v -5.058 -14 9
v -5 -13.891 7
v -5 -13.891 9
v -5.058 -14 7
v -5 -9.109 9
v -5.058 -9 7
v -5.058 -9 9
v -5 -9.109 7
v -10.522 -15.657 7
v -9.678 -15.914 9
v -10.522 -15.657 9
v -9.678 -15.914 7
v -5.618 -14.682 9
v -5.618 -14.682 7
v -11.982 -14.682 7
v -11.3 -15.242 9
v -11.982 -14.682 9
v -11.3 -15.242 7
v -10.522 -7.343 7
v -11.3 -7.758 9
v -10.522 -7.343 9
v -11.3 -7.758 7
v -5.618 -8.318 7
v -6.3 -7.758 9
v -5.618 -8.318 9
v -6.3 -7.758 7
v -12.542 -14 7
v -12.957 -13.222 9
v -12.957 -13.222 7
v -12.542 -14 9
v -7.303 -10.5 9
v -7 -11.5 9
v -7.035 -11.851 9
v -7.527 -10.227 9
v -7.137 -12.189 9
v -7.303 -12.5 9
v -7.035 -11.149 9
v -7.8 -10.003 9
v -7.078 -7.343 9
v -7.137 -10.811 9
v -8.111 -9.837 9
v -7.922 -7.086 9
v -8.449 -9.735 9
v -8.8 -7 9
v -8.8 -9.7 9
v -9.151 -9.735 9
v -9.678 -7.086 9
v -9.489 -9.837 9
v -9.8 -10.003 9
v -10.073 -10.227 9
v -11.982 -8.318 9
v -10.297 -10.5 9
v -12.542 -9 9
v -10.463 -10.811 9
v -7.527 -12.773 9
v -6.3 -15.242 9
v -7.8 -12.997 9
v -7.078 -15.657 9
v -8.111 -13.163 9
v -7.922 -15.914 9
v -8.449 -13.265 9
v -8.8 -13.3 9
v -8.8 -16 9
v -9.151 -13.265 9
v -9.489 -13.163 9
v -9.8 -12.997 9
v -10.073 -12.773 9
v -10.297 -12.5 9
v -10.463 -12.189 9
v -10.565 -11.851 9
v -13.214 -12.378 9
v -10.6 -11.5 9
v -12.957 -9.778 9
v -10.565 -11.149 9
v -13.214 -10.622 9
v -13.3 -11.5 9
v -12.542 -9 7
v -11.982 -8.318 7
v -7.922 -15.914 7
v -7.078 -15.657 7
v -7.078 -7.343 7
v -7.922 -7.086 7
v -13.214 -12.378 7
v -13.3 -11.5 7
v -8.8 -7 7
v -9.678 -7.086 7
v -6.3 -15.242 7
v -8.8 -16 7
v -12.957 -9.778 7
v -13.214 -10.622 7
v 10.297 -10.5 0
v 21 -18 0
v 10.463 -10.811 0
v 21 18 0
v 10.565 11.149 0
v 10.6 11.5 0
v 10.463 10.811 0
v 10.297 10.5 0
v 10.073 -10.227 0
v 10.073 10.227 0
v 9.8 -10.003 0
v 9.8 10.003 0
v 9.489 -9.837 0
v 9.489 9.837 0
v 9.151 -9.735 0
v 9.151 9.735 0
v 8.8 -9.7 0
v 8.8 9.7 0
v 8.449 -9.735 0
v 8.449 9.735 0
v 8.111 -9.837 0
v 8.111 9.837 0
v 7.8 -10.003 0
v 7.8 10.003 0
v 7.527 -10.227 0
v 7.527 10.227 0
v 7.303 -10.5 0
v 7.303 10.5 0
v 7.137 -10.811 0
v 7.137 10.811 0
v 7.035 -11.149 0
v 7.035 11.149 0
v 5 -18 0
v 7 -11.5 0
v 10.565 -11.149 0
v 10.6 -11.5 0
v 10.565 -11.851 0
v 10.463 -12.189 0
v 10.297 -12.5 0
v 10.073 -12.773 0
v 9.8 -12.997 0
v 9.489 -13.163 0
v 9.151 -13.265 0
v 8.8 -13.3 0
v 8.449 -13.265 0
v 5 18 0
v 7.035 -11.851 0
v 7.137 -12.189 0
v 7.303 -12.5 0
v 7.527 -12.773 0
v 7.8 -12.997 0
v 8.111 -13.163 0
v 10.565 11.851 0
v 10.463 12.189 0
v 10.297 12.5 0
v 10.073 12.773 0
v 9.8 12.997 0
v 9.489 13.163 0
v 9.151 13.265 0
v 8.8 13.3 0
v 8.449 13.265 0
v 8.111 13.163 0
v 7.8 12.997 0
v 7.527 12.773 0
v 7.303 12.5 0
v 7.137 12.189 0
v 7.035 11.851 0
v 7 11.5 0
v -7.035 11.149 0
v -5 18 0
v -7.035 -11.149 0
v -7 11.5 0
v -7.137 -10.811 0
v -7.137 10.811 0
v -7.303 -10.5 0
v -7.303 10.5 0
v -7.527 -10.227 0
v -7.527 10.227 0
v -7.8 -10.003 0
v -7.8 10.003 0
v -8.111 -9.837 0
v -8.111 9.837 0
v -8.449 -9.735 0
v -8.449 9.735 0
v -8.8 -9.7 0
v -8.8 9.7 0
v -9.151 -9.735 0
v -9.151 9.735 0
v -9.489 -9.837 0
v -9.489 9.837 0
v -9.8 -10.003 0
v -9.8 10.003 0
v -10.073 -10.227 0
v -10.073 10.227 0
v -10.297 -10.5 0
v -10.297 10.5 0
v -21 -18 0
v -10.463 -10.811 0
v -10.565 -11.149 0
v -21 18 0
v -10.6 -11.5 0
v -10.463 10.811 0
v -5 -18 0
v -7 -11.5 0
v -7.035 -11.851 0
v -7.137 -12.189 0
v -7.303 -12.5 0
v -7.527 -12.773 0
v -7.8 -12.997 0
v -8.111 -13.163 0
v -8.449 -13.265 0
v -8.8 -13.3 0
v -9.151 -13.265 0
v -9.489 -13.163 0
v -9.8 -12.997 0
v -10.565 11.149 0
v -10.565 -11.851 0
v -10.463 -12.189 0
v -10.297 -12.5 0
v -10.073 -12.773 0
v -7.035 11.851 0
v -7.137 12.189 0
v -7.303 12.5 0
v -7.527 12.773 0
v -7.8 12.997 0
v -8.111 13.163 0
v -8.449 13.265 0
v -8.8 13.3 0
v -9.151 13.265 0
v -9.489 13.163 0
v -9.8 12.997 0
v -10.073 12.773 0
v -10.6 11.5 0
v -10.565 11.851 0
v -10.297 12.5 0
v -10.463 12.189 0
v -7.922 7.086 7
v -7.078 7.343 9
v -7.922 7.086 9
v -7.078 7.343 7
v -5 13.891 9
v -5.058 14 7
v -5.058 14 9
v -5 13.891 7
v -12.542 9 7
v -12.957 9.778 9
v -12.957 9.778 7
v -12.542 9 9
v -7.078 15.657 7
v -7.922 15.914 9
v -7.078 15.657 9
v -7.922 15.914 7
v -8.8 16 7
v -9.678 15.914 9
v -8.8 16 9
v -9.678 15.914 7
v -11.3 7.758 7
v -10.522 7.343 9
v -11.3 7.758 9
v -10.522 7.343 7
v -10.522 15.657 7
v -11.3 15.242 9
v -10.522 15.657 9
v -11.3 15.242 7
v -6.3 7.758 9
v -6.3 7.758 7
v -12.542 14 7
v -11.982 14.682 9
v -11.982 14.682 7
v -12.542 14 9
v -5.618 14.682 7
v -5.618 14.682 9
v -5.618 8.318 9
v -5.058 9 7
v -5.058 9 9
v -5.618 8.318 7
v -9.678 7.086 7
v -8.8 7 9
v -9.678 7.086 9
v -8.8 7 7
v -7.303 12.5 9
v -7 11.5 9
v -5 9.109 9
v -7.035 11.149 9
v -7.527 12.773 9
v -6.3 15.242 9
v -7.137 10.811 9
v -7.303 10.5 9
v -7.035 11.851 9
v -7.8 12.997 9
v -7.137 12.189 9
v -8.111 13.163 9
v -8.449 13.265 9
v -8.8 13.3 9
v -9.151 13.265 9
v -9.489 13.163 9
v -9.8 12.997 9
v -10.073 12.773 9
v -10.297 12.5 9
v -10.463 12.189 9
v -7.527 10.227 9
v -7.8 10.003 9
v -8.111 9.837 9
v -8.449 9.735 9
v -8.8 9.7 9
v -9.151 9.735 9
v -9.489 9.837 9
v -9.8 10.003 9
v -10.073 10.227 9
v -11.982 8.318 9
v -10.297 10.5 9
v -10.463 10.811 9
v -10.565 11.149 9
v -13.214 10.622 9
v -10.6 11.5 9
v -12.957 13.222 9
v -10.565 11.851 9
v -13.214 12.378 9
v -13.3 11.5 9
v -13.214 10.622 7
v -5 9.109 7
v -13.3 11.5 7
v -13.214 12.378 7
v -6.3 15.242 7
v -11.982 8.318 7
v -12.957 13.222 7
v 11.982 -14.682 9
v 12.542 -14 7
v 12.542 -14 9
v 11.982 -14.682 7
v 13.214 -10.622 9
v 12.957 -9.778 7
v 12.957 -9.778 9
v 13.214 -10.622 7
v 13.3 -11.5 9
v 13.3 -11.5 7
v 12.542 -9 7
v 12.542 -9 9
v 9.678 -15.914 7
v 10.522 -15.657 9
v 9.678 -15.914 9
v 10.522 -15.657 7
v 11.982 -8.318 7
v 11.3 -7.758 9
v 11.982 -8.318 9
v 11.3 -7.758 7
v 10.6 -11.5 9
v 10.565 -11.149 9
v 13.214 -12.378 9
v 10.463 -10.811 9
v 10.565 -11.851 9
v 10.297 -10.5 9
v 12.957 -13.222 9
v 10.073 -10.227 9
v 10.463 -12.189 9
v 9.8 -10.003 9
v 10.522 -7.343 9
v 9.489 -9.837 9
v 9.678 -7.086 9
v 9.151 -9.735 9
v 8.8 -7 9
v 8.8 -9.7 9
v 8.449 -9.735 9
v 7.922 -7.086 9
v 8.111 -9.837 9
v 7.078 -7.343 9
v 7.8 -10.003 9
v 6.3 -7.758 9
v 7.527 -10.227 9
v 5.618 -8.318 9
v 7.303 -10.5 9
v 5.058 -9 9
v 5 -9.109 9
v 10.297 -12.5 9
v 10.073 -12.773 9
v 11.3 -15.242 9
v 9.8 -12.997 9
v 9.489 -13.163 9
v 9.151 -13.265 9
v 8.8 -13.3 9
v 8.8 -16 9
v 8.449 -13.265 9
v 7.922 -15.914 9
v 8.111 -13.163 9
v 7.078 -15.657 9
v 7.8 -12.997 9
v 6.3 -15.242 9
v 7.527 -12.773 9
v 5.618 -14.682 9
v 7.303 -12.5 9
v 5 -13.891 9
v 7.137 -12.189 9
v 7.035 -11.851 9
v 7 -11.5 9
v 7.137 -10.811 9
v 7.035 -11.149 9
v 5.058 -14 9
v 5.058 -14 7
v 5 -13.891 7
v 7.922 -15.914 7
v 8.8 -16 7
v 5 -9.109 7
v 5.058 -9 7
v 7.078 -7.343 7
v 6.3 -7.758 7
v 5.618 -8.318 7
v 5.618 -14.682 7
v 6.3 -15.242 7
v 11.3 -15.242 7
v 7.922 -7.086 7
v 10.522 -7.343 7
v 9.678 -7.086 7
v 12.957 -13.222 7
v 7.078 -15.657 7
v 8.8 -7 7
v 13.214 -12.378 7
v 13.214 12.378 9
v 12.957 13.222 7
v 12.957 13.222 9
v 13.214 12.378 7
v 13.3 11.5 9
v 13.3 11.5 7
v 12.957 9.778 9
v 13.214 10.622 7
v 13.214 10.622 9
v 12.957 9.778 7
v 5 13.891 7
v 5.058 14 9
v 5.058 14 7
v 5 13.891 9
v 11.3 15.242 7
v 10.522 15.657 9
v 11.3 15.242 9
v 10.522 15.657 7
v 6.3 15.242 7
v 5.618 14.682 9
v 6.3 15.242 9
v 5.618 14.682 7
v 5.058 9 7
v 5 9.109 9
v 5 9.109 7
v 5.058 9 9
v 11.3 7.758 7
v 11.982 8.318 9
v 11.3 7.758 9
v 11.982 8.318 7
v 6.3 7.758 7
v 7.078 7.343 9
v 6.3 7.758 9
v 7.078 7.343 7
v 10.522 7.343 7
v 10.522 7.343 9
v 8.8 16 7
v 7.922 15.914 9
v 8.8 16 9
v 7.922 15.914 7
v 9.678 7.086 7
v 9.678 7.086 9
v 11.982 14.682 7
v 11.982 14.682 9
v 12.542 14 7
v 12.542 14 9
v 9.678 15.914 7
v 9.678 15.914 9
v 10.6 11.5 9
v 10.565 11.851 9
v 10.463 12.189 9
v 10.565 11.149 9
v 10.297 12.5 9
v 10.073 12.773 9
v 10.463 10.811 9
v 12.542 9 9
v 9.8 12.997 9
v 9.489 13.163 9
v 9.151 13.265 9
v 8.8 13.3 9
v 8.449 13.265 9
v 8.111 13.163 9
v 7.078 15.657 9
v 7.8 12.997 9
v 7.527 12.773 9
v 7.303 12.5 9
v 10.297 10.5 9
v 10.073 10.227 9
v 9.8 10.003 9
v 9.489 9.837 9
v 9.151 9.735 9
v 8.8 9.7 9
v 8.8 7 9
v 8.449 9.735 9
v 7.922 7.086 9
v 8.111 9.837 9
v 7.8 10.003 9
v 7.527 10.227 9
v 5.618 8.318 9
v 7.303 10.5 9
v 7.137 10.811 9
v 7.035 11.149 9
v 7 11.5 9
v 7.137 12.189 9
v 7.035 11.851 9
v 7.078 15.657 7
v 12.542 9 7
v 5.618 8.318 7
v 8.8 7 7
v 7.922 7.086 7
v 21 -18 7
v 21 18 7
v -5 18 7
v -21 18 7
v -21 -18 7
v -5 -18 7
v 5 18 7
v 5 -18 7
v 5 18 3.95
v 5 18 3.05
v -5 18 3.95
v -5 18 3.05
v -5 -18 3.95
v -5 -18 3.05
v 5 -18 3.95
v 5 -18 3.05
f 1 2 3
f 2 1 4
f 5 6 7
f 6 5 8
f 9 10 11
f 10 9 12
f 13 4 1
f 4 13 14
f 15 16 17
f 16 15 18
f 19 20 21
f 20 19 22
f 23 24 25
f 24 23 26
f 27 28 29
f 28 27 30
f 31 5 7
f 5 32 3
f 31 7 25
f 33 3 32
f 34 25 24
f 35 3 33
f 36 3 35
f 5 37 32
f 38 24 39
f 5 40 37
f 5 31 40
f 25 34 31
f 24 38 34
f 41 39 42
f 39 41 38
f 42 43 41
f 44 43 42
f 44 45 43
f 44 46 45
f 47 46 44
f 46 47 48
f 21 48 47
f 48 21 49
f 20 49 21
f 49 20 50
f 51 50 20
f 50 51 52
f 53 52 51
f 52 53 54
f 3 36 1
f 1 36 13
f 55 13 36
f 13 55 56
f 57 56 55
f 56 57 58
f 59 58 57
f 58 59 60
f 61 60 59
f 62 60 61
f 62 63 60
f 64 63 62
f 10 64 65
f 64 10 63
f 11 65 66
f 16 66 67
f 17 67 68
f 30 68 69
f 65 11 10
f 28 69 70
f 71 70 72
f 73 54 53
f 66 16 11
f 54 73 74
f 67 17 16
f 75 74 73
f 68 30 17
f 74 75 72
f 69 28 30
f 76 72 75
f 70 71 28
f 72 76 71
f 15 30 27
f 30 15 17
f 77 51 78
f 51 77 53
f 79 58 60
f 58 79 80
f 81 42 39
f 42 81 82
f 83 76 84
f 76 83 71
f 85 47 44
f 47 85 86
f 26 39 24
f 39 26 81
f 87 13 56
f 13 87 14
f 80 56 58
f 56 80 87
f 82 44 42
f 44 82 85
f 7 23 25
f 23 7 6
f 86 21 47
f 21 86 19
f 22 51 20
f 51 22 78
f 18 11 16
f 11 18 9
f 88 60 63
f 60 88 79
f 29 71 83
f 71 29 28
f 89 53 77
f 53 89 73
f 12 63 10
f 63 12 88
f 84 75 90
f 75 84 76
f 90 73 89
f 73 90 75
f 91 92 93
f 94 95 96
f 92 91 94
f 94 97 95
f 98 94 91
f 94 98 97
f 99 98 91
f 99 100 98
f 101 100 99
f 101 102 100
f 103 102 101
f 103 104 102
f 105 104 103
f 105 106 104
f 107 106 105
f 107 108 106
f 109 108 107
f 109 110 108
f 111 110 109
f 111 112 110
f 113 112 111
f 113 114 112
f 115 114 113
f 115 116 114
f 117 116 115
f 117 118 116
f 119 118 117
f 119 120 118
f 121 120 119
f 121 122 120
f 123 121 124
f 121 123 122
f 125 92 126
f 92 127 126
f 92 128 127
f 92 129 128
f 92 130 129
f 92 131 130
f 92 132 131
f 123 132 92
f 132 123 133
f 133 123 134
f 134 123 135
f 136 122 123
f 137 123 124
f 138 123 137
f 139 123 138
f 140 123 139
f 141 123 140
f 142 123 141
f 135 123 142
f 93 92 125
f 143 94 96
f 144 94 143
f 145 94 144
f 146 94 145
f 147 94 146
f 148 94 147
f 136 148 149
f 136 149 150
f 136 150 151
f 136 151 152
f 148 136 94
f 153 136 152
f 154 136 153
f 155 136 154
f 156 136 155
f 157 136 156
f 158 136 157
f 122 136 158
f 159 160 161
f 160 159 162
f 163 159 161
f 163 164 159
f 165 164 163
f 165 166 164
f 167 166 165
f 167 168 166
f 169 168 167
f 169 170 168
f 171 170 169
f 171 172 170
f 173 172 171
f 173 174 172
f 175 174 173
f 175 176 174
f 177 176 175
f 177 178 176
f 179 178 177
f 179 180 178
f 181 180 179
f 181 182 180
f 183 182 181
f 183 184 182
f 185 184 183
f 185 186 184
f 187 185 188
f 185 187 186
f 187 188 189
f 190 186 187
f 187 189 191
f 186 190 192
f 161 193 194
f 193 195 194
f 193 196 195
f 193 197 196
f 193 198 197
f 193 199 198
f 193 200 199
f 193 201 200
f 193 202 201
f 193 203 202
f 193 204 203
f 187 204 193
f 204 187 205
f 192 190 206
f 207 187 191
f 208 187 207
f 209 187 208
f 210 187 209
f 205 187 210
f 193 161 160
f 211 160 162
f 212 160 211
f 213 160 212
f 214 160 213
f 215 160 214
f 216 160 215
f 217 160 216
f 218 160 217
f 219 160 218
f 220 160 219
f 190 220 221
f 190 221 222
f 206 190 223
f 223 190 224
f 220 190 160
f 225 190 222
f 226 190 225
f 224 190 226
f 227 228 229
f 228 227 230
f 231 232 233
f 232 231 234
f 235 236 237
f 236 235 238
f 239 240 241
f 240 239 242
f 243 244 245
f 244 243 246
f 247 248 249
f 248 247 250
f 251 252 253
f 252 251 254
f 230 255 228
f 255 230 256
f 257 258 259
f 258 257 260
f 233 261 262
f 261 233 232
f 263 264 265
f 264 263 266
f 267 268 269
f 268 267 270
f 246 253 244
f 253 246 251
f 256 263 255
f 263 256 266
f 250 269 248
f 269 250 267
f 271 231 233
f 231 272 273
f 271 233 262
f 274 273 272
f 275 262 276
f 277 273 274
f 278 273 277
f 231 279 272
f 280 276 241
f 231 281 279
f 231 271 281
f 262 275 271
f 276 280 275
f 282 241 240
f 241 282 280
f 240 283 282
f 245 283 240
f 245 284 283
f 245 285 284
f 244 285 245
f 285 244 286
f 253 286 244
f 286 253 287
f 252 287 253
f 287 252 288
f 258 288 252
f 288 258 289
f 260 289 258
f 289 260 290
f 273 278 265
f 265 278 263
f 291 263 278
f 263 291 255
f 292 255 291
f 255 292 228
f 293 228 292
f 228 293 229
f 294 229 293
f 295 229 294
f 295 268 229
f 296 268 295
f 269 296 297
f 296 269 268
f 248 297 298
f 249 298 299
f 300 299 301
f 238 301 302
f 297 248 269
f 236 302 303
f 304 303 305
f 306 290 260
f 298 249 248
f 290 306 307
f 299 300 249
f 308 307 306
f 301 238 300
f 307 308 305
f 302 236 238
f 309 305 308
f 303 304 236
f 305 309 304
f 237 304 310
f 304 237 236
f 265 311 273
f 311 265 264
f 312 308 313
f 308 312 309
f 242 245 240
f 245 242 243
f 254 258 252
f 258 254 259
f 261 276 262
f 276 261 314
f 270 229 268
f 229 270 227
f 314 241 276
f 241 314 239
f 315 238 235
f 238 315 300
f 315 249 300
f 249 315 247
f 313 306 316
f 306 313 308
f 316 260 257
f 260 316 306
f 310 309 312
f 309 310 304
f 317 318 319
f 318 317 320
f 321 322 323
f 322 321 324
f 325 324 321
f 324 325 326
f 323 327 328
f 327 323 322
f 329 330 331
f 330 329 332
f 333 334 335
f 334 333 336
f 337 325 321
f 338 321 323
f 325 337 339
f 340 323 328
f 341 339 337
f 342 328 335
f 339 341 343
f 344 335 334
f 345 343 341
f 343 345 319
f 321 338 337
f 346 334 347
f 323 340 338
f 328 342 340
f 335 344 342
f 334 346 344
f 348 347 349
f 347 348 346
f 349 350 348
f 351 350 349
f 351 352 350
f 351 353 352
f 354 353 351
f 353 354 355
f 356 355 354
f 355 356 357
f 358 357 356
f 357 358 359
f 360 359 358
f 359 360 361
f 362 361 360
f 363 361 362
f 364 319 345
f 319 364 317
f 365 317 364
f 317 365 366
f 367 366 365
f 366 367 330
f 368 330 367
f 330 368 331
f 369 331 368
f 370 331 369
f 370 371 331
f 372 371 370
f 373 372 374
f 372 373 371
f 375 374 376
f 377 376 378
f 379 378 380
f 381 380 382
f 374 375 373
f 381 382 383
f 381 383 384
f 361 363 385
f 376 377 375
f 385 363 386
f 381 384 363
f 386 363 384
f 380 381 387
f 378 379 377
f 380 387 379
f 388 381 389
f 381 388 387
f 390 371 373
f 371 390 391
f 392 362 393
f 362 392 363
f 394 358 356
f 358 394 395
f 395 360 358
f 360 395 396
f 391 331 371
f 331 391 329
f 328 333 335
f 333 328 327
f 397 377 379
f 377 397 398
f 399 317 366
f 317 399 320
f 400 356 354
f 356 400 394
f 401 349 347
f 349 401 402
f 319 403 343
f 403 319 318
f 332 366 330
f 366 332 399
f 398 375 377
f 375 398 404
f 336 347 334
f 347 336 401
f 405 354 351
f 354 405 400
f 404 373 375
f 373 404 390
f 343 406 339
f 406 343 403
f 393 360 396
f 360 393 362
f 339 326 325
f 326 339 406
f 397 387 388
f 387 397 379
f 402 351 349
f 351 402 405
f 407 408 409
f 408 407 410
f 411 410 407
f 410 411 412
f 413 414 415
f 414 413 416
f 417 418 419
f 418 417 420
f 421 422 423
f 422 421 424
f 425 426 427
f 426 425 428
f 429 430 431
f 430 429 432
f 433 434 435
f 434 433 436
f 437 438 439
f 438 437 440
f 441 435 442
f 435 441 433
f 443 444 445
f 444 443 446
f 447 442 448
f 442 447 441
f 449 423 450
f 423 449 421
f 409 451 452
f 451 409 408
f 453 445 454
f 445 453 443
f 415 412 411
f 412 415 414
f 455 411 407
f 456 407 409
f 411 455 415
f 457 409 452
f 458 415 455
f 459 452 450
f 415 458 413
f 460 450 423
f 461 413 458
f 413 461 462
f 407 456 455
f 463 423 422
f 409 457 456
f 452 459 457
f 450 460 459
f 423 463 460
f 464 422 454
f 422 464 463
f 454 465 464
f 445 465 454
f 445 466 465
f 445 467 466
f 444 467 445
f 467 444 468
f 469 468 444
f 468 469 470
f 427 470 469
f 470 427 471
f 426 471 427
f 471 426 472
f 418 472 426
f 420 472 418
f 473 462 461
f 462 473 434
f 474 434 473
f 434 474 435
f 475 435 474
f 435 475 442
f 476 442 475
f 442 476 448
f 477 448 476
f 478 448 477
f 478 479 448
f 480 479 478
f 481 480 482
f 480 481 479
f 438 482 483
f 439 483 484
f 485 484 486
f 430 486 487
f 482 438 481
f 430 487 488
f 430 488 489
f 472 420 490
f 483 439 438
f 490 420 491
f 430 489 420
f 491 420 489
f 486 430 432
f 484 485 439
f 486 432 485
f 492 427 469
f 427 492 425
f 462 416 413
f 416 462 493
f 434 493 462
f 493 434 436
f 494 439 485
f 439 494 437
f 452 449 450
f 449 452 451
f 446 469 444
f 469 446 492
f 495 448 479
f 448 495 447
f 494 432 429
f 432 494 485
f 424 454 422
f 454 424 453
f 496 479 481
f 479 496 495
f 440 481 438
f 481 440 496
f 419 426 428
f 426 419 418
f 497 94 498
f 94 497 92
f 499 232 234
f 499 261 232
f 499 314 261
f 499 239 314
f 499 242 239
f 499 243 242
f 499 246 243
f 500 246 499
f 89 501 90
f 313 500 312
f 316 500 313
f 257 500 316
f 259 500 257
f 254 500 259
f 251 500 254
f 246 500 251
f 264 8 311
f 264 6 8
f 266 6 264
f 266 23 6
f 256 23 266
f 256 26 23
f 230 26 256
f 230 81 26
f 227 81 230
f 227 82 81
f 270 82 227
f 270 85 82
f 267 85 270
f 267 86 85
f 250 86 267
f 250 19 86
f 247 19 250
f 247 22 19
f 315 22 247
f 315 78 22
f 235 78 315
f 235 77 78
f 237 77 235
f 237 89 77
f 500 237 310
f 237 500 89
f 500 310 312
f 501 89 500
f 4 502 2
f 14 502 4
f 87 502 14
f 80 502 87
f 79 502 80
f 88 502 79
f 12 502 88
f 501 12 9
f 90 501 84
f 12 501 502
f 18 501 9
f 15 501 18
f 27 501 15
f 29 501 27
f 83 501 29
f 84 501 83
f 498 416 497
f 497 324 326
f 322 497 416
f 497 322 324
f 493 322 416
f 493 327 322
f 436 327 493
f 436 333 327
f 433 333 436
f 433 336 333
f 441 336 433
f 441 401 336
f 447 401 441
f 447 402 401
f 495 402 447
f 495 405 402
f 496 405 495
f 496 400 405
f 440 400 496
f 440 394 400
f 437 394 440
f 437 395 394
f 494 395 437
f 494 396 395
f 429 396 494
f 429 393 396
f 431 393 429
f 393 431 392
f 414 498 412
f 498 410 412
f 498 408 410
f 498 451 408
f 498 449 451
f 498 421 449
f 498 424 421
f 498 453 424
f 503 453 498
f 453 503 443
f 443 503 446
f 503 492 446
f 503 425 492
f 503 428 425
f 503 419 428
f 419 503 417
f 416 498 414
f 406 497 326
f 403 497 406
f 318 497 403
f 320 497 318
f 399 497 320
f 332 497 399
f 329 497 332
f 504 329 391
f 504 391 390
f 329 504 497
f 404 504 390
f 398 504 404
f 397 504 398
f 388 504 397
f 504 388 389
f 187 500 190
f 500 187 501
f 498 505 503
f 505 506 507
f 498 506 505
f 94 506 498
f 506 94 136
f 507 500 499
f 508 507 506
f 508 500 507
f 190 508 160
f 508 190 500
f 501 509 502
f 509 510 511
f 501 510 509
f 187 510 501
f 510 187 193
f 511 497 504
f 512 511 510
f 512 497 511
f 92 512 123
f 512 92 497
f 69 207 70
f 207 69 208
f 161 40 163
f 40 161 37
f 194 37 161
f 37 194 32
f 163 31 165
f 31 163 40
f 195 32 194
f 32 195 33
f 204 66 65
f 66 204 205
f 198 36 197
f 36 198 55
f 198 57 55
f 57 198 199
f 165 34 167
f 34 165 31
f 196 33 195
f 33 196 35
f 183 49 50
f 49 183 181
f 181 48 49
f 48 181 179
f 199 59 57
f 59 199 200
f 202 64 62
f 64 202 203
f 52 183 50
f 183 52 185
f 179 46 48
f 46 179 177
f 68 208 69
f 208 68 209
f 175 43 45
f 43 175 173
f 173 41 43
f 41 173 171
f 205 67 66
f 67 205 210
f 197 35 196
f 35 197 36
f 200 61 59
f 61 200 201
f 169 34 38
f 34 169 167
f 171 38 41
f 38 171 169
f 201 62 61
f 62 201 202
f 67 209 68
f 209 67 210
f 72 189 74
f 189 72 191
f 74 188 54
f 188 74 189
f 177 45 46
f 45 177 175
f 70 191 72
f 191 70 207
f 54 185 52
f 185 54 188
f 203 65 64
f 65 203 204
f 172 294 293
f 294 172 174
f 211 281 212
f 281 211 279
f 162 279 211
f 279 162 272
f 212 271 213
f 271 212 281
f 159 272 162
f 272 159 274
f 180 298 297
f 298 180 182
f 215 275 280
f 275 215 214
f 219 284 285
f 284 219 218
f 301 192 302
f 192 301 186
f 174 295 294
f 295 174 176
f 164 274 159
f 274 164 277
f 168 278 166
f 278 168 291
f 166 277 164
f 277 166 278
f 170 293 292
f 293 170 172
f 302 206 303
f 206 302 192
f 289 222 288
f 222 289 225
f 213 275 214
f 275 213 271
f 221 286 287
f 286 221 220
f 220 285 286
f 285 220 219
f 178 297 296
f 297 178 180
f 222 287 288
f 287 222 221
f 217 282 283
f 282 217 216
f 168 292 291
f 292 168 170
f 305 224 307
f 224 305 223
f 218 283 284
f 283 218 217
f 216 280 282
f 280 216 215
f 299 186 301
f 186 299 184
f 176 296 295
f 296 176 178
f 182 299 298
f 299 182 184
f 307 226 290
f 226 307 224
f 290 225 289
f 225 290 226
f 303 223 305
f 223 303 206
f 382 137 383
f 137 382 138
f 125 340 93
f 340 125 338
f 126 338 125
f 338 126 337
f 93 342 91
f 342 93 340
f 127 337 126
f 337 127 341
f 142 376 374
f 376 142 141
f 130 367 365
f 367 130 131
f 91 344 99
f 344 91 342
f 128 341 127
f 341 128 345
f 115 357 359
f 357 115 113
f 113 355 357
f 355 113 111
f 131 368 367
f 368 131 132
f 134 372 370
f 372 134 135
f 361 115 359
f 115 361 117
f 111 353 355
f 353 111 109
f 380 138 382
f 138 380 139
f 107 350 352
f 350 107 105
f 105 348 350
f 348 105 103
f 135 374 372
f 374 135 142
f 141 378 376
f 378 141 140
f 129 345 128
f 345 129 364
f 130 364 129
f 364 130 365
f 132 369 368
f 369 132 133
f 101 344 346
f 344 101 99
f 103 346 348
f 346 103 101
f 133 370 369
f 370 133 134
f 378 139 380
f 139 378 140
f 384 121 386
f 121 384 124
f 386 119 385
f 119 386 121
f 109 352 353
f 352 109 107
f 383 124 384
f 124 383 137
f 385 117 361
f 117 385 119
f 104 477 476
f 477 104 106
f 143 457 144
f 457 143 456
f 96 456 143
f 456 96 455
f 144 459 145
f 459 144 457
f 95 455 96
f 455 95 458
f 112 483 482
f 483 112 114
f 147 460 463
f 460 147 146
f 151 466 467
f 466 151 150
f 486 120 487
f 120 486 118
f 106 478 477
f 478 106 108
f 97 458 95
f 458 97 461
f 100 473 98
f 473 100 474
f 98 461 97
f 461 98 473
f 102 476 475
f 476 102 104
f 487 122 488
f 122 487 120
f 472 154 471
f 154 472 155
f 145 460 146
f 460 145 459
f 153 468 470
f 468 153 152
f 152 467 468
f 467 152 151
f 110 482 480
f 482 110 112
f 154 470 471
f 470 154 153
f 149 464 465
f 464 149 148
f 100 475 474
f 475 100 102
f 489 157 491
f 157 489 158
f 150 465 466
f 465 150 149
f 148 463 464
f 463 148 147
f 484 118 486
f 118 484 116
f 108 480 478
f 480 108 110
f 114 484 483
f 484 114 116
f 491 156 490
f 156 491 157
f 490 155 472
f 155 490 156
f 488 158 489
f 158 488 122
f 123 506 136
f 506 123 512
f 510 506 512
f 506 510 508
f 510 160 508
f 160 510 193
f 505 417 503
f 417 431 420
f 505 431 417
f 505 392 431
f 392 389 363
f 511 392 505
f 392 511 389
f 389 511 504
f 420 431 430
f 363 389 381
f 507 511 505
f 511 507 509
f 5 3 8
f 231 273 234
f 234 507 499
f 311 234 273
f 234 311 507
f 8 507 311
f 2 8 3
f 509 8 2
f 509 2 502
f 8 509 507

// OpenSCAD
$fn = 32;

// ----------------------------------------------------------------------
// Living hinge: 42 x 36 mm plates, 0.9 mm flexible web
// ----------------------------------------------------------------------

// --- parameters (mm) ---
plate_len = 16;           // plate length outside the web
plate_w = 36;             // plate width
thick = 7;                // plate thickness
web_half = 5;             // half width of the flex band
web_t = 0.9;              // flexible web thickness
web_z = 3.05;             // web position inside the thickness
boss_d = 9;               // screw boss diameter
boss_h = 9;               // screw boss height
boss_x = 8.8;             // screw boss distance from the web
screw_d = 3.6;            // screw hole

difference() {
  union() {
    /* one flat strip, later thinned at the middle */
    translate([-21, -18, 0]) cube([42, 36, 7]);
    /* screw bosses, sunk 0.5 mm into the plates */
    for (sx = [-8.8, 8.8]) {
      for (sy = [-11.5, 11.5]) {
        translate([sx, sy, 0]) cylinder(h = boss_h, d = boss_d);
      }
    }
  }
  /* channel from below: leaves the web on top of it */
  translate([-5, -20.5, -2.5]) cube([10, 41, 5.55]);
  /* channel from above: thins the web down to web_t */
  translate([-5, -20.5, 3.95]) cube([10, 41, 5.55]);
  /* screw holes through the bosses */
  for (sx = [-8.8, 8.8]) {
    for (sy = [-11.5, 11.5]) {
      translate([sx, sy, -2.5]) cylinder(h = boss_h + 5, d = screw_d);
    }
  }
}
